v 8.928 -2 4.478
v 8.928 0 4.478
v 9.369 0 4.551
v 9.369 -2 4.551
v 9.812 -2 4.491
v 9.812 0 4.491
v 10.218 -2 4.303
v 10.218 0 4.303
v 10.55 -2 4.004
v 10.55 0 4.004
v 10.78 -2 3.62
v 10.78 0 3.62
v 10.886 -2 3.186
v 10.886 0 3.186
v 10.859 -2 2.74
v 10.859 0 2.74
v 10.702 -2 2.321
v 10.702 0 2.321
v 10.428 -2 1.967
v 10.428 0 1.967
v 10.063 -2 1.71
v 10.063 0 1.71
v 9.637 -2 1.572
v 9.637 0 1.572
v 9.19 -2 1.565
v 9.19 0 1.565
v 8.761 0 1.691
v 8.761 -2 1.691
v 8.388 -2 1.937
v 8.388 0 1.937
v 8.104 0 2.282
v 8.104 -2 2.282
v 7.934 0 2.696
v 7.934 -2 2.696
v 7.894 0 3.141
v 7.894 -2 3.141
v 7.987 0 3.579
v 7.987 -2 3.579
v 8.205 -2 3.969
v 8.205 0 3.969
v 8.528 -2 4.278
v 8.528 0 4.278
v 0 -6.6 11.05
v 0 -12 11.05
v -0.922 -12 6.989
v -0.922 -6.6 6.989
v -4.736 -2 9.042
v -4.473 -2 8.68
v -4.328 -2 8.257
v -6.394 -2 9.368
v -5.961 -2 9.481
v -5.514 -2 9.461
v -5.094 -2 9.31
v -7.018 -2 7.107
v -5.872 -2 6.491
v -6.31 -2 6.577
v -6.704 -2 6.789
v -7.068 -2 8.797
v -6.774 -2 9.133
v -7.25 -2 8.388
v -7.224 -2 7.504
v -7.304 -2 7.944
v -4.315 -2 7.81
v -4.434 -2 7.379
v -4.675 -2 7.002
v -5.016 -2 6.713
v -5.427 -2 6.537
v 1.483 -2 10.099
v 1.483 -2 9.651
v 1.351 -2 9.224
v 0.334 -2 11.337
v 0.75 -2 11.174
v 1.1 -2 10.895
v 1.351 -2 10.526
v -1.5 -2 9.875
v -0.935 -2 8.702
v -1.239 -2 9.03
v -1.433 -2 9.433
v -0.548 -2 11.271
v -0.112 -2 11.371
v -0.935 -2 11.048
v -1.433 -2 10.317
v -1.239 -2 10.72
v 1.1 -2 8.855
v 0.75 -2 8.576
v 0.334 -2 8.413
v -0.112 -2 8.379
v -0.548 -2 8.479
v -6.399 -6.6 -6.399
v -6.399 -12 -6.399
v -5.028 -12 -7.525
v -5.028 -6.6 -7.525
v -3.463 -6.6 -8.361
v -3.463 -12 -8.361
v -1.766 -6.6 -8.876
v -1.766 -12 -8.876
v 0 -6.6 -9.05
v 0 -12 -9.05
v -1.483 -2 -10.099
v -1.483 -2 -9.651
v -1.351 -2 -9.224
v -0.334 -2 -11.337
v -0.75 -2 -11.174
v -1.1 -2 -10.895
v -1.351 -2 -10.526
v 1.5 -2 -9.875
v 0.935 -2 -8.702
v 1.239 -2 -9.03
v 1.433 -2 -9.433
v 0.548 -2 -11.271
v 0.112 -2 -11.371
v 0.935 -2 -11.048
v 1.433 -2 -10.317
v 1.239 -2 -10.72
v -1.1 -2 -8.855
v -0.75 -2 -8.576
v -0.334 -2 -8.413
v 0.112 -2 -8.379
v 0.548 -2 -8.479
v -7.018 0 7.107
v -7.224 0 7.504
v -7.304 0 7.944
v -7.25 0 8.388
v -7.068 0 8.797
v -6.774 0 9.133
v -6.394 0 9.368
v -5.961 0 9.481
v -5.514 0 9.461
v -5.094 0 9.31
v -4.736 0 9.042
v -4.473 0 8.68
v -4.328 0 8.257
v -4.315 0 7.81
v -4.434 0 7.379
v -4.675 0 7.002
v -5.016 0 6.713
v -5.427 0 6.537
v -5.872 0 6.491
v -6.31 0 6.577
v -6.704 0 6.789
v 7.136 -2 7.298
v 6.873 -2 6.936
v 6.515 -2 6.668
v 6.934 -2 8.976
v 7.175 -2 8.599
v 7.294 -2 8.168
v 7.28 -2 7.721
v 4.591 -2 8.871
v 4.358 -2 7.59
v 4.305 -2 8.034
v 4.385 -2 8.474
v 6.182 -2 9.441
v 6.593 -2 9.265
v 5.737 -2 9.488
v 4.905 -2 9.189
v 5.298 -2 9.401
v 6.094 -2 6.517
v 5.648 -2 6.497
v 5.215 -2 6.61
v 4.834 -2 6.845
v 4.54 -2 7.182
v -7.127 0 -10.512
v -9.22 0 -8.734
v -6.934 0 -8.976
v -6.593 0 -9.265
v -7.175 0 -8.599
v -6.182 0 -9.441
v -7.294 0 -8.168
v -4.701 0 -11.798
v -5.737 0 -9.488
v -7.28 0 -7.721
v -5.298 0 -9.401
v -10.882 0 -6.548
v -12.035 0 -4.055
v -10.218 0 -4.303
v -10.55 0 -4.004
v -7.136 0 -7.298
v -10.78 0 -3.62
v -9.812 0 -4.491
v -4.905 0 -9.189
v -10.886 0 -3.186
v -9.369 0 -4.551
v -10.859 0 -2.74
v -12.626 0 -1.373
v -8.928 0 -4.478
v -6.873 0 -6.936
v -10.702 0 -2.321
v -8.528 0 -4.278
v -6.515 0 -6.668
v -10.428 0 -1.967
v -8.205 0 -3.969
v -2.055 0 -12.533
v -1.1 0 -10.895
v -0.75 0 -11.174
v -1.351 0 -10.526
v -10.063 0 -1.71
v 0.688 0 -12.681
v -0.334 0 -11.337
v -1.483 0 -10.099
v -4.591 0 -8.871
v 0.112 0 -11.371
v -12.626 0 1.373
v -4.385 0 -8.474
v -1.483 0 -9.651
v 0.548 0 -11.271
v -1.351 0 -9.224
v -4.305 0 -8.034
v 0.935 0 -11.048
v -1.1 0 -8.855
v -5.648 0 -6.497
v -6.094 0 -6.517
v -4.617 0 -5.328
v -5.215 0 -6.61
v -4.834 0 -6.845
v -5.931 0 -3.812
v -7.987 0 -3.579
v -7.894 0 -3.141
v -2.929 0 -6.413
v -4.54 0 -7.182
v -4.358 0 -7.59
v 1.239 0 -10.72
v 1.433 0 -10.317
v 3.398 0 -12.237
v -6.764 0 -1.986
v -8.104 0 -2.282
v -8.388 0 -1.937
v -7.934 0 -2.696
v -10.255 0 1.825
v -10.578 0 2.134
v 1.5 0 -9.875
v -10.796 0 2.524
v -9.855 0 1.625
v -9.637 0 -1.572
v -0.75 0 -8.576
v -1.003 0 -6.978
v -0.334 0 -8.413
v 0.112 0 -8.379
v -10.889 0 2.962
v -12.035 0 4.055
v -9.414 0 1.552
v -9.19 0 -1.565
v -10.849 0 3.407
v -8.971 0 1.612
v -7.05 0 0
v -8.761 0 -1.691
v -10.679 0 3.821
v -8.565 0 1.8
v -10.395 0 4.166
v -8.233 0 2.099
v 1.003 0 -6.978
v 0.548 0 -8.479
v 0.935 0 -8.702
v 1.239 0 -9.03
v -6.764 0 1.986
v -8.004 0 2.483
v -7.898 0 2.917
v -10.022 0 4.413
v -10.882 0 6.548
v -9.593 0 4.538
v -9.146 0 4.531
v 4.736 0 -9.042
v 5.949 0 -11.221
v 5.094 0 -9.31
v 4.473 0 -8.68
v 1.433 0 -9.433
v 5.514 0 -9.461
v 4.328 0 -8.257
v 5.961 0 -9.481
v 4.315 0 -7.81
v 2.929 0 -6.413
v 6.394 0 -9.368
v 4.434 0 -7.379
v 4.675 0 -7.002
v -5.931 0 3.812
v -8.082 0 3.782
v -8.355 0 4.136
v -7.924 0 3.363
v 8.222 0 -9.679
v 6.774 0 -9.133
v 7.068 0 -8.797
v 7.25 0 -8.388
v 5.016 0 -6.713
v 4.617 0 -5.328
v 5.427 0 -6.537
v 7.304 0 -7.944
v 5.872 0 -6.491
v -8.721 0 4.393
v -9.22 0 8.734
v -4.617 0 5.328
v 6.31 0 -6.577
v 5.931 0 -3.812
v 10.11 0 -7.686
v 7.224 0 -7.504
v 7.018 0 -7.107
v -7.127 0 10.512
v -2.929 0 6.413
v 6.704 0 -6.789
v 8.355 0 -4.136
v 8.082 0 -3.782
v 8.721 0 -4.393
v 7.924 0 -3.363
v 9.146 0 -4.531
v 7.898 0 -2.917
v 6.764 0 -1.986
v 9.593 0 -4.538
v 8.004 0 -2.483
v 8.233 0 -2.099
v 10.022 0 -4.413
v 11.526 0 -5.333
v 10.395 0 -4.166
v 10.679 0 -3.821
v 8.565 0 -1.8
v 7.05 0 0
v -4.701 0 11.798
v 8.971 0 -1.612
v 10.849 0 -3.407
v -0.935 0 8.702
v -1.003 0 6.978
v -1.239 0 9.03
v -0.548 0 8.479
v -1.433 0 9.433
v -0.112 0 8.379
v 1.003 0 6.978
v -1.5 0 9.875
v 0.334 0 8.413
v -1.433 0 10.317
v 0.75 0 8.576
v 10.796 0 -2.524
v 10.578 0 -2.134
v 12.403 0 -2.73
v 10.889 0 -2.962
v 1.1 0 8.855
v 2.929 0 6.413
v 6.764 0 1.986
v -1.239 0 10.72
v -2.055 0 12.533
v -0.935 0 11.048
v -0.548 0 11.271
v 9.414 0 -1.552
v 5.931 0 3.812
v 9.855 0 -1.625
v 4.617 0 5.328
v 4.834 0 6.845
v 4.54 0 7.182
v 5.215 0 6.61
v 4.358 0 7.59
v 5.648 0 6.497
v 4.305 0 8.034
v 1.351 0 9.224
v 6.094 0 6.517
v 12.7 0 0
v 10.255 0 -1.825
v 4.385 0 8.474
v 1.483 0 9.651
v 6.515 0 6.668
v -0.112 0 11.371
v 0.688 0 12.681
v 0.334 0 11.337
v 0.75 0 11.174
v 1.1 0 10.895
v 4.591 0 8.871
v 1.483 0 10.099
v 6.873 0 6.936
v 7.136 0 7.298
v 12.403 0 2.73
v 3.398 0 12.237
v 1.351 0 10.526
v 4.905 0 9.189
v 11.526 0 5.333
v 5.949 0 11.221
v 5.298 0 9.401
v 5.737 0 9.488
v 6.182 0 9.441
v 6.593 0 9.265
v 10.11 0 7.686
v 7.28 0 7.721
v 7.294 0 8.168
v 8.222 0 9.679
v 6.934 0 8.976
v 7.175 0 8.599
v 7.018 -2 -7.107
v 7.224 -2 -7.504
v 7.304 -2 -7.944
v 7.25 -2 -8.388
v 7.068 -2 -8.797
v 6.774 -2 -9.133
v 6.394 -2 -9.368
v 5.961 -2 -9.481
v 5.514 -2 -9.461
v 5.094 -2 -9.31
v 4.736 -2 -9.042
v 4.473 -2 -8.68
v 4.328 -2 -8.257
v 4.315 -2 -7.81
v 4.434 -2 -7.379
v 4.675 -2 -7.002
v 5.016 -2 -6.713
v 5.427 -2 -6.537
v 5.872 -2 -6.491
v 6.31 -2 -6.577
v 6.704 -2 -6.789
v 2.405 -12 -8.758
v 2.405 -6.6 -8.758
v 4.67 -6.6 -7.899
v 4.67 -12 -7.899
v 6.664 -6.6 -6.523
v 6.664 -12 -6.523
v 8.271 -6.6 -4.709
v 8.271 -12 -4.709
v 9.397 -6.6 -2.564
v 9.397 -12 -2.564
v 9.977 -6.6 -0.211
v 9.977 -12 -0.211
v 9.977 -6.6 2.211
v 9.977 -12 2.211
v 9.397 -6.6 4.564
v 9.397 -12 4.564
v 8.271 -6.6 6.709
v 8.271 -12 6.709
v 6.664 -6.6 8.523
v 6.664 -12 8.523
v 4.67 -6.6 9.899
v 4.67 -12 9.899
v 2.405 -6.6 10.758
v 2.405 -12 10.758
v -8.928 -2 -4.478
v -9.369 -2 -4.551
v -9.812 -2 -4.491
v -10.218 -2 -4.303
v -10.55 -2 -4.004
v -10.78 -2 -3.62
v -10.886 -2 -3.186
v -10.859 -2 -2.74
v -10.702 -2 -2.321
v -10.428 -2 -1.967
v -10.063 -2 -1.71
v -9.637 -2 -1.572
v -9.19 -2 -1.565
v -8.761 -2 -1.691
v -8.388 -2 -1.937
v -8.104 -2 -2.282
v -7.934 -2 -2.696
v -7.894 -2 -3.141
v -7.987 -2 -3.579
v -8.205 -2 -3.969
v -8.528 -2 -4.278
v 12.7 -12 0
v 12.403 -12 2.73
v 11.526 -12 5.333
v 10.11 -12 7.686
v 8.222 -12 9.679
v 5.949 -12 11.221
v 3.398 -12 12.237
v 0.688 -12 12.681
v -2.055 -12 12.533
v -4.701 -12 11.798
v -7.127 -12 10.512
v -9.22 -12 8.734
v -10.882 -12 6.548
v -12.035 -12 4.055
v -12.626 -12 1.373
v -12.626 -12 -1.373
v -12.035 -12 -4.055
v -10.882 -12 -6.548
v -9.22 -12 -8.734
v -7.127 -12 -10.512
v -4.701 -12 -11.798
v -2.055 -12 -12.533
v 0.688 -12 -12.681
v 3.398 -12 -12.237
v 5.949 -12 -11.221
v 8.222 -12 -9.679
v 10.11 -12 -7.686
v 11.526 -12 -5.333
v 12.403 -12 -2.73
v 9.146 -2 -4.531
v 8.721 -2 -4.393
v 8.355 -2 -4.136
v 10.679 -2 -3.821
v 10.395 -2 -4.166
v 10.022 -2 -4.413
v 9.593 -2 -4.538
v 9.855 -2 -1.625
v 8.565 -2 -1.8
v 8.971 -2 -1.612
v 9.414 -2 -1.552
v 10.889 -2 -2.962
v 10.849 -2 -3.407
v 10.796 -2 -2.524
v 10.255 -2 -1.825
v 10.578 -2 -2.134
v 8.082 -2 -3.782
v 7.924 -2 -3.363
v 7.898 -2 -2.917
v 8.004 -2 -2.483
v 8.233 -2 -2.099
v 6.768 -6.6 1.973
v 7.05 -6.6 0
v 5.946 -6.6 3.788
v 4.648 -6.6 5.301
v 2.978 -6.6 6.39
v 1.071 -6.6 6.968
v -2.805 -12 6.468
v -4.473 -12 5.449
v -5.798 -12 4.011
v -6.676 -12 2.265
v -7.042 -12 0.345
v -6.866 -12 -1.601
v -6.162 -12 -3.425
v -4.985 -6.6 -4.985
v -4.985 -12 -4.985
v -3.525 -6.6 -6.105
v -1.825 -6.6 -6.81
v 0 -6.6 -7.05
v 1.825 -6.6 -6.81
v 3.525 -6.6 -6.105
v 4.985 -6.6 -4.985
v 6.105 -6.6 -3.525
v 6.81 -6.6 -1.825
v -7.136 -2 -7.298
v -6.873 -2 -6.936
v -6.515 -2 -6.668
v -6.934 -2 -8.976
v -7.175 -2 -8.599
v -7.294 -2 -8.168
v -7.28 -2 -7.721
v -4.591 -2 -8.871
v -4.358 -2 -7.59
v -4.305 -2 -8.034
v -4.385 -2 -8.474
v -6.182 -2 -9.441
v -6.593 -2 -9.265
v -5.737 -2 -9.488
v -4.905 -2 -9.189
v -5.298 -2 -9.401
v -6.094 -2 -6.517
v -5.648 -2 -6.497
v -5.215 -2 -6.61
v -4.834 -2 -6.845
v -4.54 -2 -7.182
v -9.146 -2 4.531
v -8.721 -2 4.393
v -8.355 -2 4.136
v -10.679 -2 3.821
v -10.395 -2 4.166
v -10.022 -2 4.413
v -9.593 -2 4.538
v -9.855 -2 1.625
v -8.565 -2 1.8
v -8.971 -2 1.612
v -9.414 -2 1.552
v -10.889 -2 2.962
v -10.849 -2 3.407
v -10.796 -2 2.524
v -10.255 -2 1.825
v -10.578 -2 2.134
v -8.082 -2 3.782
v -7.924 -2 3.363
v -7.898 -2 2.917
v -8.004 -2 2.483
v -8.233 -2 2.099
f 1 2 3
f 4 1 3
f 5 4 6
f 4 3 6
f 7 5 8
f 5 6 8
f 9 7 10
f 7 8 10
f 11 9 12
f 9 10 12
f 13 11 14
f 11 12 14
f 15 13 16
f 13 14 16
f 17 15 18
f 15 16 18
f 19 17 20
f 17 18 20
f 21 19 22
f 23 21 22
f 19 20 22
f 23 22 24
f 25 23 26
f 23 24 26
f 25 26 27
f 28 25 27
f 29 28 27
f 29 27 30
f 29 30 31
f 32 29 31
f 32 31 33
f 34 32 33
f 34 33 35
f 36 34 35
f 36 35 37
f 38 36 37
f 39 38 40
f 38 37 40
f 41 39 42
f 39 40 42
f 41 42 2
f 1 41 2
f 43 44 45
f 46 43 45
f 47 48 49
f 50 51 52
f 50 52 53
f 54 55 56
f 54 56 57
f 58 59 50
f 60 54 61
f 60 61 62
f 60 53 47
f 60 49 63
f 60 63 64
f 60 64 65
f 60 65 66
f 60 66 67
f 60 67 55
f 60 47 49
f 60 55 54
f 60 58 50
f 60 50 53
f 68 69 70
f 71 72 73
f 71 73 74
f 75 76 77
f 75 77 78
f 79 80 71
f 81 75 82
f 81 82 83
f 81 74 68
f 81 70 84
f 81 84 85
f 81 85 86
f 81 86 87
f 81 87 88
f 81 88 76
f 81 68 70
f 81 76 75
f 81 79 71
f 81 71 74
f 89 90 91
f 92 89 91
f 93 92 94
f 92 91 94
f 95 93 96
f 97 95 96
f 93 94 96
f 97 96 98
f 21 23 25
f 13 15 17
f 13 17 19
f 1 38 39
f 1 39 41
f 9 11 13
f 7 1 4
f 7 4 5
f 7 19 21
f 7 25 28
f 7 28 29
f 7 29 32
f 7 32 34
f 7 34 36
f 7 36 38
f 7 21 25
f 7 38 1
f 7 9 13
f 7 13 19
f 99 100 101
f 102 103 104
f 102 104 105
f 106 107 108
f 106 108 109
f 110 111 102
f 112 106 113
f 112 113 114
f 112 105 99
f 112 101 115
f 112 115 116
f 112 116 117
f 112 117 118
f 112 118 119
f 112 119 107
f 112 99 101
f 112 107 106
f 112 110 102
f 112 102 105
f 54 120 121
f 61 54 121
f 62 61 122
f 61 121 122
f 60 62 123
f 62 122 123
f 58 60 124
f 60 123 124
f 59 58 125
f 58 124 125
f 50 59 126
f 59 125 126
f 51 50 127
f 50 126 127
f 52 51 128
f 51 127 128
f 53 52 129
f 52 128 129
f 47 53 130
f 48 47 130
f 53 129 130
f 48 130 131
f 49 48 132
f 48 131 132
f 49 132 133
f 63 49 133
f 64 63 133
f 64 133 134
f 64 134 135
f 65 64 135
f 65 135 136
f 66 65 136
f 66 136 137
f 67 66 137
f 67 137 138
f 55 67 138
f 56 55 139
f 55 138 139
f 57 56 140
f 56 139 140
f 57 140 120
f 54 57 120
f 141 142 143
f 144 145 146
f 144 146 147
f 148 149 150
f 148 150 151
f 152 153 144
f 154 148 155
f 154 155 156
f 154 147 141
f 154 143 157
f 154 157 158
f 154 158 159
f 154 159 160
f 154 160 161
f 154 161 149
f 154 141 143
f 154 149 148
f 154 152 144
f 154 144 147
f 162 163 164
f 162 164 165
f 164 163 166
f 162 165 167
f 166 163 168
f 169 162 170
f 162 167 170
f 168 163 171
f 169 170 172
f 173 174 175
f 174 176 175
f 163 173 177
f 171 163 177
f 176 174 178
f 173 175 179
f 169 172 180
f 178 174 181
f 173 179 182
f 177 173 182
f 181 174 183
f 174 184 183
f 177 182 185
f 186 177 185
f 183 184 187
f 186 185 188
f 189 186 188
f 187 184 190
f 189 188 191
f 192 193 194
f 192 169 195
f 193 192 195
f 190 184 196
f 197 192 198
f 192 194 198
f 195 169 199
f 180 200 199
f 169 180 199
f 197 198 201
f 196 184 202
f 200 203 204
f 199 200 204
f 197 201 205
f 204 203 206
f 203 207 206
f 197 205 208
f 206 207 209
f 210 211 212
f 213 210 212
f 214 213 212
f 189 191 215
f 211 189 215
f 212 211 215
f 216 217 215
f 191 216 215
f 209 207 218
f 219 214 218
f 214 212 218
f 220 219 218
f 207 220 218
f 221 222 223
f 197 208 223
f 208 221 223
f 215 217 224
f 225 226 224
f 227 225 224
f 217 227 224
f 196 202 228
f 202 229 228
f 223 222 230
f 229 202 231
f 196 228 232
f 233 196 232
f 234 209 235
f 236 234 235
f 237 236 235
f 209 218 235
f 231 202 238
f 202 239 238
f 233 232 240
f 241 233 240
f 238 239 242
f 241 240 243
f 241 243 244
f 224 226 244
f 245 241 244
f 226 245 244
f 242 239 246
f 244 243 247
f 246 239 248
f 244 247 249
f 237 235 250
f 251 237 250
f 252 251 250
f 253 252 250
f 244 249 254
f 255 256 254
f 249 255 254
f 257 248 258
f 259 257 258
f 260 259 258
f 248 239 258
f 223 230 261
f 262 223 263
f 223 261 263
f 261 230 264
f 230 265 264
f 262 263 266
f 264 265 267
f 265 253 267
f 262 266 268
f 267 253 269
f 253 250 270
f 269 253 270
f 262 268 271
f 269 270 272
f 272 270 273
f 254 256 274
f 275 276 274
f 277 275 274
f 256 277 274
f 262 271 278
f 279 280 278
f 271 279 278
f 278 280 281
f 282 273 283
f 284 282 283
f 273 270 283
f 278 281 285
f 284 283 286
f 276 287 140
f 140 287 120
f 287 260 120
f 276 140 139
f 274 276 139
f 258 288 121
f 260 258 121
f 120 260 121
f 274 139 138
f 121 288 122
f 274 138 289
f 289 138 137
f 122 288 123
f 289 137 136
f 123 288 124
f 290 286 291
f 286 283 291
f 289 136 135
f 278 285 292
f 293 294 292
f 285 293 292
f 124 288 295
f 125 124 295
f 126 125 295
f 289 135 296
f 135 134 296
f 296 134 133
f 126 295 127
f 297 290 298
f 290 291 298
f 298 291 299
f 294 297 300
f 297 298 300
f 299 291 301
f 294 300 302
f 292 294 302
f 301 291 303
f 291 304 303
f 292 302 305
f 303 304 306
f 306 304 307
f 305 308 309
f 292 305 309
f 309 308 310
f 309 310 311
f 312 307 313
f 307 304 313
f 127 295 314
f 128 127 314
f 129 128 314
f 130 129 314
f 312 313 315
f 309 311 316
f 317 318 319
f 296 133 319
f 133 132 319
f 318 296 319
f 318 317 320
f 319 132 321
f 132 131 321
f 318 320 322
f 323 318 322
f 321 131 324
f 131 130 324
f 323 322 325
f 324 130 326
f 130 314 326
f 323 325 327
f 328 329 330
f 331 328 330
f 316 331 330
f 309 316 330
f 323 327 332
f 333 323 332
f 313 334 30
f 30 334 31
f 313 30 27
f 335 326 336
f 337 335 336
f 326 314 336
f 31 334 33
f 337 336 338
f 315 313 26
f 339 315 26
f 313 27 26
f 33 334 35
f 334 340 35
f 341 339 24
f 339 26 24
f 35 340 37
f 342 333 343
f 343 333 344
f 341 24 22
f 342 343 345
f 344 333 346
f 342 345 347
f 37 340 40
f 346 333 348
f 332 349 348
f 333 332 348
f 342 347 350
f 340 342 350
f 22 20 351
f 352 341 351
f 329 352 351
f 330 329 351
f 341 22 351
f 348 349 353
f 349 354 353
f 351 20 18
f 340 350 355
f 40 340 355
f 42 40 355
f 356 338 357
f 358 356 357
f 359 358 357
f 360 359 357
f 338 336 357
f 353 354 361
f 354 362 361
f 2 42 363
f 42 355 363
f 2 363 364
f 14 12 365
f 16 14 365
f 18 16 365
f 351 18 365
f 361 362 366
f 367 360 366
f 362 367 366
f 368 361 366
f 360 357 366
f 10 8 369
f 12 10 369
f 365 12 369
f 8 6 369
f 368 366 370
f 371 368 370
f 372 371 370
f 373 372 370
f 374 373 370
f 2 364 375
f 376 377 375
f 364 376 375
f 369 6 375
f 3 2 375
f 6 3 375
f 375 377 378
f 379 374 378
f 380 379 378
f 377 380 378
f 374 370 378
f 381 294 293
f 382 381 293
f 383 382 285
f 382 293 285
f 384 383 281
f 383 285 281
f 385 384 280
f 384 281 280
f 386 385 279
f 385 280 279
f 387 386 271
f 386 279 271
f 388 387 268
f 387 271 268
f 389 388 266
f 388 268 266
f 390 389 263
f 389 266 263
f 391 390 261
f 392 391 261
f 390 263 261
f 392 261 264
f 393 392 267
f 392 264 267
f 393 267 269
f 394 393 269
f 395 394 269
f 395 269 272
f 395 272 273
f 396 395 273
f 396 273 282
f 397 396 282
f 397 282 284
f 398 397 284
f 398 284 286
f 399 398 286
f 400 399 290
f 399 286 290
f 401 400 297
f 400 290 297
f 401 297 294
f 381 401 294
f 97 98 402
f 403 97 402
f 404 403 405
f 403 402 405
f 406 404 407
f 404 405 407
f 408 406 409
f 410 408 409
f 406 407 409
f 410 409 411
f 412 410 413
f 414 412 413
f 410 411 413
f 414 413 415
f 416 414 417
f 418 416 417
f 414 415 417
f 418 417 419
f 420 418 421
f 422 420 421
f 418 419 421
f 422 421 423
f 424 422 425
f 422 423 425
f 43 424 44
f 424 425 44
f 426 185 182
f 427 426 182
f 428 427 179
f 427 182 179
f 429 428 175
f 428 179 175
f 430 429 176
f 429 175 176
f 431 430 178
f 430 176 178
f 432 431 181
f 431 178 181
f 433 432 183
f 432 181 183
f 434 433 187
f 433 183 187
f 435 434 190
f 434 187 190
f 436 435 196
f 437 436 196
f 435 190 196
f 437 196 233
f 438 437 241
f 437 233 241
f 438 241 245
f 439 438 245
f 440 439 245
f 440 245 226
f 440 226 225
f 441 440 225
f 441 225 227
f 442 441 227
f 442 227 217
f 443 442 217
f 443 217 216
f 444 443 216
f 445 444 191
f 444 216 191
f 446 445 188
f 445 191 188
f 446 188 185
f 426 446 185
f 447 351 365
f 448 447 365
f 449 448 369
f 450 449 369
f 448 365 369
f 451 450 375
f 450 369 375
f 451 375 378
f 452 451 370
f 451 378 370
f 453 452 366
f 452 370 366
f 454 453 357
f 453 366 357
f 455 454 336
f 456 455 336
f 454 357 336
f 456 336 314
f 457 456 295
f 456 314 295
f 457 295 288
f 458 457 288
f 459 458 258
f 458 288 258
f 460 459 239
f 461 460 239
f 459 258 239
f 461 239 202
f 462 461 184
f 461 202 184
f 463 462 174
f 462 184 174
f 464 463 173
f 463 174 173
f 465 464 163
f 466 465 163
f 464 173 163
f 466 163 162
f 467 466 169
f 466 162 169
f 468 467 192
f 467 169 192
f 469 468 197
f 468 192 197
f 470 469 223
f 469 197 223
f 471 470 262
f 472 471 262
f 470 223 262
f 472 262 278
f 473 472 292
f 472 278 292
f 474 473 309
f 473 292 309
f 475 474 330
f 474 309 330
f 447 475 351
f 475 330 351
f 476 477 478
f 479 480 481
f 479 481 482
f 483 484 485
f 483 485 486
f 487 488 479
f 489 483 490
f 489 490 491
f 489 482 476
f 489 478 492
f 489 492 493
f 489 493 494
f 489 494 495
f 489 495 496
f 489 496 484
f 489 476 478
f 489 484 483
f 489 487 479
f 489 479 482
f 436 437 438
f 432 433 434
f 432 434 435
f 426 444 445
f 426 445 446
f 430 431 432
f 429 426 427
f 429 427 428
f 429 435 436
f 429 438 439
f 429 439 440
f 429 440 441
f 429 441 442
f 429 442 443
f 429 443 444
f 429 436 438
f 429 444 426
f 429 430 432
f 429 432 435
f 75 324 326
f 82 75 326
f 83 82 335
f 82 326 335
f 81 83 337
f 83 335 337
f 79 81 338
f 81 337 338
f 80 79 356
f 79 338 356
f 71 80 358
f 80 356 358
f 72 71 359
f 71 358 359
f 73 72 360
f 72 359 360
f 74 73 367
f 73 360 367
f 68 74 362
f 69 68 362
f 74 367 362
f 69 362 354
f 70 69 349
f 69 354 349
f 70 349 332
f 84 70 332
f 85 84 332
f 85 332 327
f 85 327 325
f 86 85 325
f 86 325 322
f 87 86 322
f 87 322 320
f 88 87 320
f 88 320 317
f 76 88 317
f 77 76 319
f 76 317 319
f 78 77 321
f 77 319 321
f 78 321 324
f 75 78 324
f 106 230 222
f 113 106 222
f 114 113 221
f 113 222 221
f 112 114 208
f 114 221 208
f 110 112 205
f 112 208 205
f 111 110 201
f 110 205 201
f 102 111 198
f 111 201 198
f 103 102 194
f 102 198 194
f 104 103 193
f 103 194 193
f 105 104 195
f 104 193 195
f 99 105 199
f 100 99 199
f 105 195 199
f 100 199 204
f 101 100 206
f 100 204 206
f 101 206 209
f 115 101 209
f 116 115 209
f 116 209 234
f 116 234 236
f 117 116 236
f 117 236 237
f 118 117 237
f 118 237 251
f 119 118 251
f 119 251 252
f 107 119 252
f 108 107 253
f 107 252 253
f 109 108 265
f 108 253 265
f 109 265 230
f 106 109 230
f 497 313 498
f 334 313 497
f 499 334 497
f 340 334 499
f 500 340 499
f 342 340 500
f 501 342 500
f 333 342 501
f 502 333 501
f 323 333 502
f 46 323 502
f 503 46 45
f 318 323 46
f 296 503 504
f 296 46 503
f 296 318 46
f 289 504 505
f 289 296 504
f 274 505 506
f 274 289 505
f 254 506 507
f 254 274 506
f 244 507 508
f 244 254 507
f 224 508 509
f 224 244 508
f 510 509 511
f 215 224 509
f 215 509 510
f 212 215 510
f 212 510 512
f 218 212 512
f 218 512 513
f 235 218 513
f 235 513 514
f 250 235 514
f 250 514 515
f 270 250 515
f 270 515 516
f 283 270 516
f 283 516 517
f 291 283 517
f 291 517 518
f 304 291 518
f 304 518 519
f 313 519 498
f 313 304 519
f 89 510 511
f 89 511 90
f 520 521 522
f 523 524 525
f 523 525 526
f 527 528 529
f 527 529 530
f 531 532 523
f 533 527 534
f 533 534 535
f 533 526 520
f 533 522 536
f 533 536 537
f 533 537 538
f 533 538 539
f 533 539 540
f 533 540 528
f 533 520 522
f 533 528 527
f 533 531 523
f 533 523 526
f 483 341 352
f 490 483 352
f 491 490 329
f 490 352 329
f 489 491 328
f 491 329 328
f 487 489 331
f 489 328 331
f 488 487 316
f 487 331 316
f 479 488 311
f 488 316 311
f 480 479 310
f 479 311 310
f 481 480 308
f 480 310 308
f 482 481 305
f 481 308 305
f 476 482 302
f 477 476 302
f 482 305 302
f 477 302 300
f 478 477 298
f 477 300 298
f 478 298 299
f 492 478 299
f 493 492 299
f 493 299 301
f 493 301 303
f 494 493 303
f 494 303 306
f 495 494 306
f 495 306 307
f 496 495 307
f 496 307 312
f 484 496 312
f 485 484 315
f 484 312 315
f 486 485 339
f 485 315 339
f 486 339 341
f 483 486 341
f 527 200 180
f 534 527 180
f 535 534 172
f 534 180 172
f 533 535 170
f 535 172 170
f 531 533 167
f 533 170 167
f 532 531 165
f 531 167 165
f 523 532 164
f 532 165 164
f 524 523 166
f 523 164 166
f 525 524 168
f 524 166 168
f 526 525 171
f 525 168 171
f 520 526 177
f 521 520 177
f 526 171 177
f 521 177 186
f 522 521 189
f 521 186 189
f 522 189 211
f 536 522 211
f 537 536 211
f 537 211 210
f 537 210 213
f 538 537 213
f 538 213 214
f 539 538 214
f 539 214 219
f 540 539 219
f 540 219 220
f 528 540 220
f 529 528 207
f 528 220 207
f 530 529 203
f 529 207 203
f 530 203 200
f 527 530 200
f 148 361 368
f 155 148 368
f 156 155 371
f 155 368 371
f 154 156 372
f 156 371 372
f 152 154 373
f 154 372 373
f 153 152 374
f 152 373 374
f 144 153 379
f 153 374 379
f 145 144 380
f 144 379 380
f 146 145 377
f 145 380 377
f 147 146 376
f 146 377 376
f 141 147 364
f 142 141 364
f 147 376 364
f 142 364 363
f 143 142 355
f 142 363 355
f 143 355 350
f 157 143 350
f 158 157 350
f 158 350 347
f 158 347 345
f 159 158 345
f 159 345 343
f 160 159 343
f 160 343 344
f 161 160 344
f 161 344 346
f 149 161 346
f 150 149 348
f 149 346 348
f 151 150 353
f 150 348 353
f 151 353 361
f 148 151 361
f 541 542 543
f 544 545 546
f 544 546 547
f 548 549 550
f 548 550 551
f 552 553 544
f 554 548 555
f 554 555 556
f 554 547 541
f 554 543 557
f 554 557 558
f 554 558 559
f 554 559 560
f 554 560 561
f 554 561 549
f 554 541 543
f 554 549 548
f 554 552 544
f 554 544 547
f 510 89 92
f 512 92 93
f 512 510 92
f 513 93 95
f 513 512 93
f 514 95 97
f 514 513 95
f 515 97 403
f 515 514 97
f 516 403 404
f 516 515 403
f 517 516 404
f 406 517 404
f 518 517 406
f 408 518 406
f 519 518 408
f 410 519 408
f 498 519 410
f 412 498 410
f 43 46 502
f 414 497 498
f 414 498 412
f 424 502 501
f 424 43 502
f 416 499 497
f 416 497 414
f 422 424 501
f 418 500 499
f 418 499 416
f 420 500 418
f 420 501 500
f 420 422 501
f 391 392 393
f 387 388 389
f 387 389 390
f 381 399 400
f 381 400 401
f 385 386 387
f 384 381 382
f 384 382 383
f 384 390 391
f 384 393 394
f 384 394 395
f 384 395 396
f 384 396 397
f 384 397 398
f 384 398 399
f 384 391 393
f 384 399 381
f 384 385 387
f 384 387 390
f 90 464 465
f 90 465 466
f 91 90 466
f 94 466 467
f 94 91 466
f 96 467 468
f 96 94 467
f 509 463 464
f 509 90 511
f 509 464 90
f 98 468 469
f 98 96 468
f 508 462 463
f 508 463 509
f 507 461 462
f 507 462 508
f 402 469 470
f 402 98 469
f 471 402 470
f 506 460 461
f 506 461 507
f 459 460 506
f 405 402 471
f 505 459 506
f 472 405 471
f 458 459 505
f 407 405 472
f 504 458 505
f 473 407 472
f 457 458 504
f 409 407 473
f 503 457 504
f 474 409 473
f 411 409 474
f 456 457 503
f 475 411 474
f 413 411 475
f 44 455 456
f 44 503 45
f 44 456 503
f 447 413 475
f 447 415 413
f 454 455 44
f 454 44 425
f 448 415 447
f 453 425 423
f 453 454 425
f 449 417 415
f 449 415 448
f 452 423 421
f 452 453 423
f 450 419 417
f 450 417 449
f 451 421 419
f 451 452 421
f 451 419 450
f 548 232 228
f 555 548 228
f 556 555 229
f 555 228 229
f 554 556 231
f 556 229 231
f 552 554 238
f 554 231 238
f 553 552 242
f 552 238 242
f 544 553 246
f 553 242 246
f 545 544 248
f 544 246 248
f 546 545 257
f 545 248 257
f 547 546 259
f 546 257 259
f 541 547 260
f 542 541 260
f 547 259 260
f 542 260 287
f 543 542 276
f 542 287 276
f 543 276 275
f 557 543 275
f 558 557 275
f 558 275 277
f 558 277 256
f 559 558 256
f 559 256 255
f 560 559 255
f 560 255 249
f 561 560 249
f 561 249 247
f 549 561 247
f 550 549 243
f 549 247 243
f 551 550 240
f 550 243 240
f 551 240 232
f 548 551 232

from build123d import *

# Parameters (mm, degrees)
F0_R            = 12.7
F0_R_2          = 7.05
F1_DEPTH        = 12
F3_DEPTH        = 5.4
F4_R            = 1.5
F5_DEPTH        = 2
F5_COPIES_COUNT = 10


# Not quite as in the source:
# - a pattern or mirror of a feature is missing from the dataset's text; its kind, count and spacing are read off the source's solid


with BuildPart() as f1:
    # F0 (on Front) → F1 (new body)
    with BuildSketch(Plane.XZ):
        Circle(F0_R)
        Circle(F0_R_2, mode=Mode.SUBTRACT)
    extrude(amount=F1_DEPTH)

    # F2 (on face) → F3 (cut)
    with BuildSketch(Plane.XZ.offset(12)):
        with BuildLine():
            Line((-4.9851028074, -4.9851028074), (-6.3993163697, -6.3993163697))
            ThreePointArc((-6.3993163697, -6.3993163697), (-3.4632850629, -8.3611097692), (0, -9.05))
            ThreePointArc((0, -9.05), (10.05, 1), (0, 11.05))
            Line((0, 11.05), (-0.9218489985, 6.9894702535))
            ThreePointArc((-0.9218489985, 6.9894702535), (6.6761231195, -2.2653653334), (-4.9851028074, -4.9851028074))
        make_face()
    extrude(amount=-F3_DEPTH, mode=Mode.SUBTRACT)

    # F4 (on face) → F5 (cut)
    with BuildSketch(Plane(origin=(0, 0, 0), x_dir=(-1, 0, 0), z_dir=(0, 1, 0))):
        with Locations((0, 9.875)):
            Circle(F4_R)
    f5 = extrude(amount=-F5_DEPTH, mode=Mode.SUBTRACT)

    # F5_copies: F5 ×10 about axis
    f5_copies_axis = Axis((0, 0, 0), (0, 1, 0))
    for i in range(1, F5_COPIES_COUNT):
        add(f5.rotate(f5_copies_axis, i * 360 / F5_COPIES_COUNT), mode=Mode.SUBTRACT)


solid = f1.part
